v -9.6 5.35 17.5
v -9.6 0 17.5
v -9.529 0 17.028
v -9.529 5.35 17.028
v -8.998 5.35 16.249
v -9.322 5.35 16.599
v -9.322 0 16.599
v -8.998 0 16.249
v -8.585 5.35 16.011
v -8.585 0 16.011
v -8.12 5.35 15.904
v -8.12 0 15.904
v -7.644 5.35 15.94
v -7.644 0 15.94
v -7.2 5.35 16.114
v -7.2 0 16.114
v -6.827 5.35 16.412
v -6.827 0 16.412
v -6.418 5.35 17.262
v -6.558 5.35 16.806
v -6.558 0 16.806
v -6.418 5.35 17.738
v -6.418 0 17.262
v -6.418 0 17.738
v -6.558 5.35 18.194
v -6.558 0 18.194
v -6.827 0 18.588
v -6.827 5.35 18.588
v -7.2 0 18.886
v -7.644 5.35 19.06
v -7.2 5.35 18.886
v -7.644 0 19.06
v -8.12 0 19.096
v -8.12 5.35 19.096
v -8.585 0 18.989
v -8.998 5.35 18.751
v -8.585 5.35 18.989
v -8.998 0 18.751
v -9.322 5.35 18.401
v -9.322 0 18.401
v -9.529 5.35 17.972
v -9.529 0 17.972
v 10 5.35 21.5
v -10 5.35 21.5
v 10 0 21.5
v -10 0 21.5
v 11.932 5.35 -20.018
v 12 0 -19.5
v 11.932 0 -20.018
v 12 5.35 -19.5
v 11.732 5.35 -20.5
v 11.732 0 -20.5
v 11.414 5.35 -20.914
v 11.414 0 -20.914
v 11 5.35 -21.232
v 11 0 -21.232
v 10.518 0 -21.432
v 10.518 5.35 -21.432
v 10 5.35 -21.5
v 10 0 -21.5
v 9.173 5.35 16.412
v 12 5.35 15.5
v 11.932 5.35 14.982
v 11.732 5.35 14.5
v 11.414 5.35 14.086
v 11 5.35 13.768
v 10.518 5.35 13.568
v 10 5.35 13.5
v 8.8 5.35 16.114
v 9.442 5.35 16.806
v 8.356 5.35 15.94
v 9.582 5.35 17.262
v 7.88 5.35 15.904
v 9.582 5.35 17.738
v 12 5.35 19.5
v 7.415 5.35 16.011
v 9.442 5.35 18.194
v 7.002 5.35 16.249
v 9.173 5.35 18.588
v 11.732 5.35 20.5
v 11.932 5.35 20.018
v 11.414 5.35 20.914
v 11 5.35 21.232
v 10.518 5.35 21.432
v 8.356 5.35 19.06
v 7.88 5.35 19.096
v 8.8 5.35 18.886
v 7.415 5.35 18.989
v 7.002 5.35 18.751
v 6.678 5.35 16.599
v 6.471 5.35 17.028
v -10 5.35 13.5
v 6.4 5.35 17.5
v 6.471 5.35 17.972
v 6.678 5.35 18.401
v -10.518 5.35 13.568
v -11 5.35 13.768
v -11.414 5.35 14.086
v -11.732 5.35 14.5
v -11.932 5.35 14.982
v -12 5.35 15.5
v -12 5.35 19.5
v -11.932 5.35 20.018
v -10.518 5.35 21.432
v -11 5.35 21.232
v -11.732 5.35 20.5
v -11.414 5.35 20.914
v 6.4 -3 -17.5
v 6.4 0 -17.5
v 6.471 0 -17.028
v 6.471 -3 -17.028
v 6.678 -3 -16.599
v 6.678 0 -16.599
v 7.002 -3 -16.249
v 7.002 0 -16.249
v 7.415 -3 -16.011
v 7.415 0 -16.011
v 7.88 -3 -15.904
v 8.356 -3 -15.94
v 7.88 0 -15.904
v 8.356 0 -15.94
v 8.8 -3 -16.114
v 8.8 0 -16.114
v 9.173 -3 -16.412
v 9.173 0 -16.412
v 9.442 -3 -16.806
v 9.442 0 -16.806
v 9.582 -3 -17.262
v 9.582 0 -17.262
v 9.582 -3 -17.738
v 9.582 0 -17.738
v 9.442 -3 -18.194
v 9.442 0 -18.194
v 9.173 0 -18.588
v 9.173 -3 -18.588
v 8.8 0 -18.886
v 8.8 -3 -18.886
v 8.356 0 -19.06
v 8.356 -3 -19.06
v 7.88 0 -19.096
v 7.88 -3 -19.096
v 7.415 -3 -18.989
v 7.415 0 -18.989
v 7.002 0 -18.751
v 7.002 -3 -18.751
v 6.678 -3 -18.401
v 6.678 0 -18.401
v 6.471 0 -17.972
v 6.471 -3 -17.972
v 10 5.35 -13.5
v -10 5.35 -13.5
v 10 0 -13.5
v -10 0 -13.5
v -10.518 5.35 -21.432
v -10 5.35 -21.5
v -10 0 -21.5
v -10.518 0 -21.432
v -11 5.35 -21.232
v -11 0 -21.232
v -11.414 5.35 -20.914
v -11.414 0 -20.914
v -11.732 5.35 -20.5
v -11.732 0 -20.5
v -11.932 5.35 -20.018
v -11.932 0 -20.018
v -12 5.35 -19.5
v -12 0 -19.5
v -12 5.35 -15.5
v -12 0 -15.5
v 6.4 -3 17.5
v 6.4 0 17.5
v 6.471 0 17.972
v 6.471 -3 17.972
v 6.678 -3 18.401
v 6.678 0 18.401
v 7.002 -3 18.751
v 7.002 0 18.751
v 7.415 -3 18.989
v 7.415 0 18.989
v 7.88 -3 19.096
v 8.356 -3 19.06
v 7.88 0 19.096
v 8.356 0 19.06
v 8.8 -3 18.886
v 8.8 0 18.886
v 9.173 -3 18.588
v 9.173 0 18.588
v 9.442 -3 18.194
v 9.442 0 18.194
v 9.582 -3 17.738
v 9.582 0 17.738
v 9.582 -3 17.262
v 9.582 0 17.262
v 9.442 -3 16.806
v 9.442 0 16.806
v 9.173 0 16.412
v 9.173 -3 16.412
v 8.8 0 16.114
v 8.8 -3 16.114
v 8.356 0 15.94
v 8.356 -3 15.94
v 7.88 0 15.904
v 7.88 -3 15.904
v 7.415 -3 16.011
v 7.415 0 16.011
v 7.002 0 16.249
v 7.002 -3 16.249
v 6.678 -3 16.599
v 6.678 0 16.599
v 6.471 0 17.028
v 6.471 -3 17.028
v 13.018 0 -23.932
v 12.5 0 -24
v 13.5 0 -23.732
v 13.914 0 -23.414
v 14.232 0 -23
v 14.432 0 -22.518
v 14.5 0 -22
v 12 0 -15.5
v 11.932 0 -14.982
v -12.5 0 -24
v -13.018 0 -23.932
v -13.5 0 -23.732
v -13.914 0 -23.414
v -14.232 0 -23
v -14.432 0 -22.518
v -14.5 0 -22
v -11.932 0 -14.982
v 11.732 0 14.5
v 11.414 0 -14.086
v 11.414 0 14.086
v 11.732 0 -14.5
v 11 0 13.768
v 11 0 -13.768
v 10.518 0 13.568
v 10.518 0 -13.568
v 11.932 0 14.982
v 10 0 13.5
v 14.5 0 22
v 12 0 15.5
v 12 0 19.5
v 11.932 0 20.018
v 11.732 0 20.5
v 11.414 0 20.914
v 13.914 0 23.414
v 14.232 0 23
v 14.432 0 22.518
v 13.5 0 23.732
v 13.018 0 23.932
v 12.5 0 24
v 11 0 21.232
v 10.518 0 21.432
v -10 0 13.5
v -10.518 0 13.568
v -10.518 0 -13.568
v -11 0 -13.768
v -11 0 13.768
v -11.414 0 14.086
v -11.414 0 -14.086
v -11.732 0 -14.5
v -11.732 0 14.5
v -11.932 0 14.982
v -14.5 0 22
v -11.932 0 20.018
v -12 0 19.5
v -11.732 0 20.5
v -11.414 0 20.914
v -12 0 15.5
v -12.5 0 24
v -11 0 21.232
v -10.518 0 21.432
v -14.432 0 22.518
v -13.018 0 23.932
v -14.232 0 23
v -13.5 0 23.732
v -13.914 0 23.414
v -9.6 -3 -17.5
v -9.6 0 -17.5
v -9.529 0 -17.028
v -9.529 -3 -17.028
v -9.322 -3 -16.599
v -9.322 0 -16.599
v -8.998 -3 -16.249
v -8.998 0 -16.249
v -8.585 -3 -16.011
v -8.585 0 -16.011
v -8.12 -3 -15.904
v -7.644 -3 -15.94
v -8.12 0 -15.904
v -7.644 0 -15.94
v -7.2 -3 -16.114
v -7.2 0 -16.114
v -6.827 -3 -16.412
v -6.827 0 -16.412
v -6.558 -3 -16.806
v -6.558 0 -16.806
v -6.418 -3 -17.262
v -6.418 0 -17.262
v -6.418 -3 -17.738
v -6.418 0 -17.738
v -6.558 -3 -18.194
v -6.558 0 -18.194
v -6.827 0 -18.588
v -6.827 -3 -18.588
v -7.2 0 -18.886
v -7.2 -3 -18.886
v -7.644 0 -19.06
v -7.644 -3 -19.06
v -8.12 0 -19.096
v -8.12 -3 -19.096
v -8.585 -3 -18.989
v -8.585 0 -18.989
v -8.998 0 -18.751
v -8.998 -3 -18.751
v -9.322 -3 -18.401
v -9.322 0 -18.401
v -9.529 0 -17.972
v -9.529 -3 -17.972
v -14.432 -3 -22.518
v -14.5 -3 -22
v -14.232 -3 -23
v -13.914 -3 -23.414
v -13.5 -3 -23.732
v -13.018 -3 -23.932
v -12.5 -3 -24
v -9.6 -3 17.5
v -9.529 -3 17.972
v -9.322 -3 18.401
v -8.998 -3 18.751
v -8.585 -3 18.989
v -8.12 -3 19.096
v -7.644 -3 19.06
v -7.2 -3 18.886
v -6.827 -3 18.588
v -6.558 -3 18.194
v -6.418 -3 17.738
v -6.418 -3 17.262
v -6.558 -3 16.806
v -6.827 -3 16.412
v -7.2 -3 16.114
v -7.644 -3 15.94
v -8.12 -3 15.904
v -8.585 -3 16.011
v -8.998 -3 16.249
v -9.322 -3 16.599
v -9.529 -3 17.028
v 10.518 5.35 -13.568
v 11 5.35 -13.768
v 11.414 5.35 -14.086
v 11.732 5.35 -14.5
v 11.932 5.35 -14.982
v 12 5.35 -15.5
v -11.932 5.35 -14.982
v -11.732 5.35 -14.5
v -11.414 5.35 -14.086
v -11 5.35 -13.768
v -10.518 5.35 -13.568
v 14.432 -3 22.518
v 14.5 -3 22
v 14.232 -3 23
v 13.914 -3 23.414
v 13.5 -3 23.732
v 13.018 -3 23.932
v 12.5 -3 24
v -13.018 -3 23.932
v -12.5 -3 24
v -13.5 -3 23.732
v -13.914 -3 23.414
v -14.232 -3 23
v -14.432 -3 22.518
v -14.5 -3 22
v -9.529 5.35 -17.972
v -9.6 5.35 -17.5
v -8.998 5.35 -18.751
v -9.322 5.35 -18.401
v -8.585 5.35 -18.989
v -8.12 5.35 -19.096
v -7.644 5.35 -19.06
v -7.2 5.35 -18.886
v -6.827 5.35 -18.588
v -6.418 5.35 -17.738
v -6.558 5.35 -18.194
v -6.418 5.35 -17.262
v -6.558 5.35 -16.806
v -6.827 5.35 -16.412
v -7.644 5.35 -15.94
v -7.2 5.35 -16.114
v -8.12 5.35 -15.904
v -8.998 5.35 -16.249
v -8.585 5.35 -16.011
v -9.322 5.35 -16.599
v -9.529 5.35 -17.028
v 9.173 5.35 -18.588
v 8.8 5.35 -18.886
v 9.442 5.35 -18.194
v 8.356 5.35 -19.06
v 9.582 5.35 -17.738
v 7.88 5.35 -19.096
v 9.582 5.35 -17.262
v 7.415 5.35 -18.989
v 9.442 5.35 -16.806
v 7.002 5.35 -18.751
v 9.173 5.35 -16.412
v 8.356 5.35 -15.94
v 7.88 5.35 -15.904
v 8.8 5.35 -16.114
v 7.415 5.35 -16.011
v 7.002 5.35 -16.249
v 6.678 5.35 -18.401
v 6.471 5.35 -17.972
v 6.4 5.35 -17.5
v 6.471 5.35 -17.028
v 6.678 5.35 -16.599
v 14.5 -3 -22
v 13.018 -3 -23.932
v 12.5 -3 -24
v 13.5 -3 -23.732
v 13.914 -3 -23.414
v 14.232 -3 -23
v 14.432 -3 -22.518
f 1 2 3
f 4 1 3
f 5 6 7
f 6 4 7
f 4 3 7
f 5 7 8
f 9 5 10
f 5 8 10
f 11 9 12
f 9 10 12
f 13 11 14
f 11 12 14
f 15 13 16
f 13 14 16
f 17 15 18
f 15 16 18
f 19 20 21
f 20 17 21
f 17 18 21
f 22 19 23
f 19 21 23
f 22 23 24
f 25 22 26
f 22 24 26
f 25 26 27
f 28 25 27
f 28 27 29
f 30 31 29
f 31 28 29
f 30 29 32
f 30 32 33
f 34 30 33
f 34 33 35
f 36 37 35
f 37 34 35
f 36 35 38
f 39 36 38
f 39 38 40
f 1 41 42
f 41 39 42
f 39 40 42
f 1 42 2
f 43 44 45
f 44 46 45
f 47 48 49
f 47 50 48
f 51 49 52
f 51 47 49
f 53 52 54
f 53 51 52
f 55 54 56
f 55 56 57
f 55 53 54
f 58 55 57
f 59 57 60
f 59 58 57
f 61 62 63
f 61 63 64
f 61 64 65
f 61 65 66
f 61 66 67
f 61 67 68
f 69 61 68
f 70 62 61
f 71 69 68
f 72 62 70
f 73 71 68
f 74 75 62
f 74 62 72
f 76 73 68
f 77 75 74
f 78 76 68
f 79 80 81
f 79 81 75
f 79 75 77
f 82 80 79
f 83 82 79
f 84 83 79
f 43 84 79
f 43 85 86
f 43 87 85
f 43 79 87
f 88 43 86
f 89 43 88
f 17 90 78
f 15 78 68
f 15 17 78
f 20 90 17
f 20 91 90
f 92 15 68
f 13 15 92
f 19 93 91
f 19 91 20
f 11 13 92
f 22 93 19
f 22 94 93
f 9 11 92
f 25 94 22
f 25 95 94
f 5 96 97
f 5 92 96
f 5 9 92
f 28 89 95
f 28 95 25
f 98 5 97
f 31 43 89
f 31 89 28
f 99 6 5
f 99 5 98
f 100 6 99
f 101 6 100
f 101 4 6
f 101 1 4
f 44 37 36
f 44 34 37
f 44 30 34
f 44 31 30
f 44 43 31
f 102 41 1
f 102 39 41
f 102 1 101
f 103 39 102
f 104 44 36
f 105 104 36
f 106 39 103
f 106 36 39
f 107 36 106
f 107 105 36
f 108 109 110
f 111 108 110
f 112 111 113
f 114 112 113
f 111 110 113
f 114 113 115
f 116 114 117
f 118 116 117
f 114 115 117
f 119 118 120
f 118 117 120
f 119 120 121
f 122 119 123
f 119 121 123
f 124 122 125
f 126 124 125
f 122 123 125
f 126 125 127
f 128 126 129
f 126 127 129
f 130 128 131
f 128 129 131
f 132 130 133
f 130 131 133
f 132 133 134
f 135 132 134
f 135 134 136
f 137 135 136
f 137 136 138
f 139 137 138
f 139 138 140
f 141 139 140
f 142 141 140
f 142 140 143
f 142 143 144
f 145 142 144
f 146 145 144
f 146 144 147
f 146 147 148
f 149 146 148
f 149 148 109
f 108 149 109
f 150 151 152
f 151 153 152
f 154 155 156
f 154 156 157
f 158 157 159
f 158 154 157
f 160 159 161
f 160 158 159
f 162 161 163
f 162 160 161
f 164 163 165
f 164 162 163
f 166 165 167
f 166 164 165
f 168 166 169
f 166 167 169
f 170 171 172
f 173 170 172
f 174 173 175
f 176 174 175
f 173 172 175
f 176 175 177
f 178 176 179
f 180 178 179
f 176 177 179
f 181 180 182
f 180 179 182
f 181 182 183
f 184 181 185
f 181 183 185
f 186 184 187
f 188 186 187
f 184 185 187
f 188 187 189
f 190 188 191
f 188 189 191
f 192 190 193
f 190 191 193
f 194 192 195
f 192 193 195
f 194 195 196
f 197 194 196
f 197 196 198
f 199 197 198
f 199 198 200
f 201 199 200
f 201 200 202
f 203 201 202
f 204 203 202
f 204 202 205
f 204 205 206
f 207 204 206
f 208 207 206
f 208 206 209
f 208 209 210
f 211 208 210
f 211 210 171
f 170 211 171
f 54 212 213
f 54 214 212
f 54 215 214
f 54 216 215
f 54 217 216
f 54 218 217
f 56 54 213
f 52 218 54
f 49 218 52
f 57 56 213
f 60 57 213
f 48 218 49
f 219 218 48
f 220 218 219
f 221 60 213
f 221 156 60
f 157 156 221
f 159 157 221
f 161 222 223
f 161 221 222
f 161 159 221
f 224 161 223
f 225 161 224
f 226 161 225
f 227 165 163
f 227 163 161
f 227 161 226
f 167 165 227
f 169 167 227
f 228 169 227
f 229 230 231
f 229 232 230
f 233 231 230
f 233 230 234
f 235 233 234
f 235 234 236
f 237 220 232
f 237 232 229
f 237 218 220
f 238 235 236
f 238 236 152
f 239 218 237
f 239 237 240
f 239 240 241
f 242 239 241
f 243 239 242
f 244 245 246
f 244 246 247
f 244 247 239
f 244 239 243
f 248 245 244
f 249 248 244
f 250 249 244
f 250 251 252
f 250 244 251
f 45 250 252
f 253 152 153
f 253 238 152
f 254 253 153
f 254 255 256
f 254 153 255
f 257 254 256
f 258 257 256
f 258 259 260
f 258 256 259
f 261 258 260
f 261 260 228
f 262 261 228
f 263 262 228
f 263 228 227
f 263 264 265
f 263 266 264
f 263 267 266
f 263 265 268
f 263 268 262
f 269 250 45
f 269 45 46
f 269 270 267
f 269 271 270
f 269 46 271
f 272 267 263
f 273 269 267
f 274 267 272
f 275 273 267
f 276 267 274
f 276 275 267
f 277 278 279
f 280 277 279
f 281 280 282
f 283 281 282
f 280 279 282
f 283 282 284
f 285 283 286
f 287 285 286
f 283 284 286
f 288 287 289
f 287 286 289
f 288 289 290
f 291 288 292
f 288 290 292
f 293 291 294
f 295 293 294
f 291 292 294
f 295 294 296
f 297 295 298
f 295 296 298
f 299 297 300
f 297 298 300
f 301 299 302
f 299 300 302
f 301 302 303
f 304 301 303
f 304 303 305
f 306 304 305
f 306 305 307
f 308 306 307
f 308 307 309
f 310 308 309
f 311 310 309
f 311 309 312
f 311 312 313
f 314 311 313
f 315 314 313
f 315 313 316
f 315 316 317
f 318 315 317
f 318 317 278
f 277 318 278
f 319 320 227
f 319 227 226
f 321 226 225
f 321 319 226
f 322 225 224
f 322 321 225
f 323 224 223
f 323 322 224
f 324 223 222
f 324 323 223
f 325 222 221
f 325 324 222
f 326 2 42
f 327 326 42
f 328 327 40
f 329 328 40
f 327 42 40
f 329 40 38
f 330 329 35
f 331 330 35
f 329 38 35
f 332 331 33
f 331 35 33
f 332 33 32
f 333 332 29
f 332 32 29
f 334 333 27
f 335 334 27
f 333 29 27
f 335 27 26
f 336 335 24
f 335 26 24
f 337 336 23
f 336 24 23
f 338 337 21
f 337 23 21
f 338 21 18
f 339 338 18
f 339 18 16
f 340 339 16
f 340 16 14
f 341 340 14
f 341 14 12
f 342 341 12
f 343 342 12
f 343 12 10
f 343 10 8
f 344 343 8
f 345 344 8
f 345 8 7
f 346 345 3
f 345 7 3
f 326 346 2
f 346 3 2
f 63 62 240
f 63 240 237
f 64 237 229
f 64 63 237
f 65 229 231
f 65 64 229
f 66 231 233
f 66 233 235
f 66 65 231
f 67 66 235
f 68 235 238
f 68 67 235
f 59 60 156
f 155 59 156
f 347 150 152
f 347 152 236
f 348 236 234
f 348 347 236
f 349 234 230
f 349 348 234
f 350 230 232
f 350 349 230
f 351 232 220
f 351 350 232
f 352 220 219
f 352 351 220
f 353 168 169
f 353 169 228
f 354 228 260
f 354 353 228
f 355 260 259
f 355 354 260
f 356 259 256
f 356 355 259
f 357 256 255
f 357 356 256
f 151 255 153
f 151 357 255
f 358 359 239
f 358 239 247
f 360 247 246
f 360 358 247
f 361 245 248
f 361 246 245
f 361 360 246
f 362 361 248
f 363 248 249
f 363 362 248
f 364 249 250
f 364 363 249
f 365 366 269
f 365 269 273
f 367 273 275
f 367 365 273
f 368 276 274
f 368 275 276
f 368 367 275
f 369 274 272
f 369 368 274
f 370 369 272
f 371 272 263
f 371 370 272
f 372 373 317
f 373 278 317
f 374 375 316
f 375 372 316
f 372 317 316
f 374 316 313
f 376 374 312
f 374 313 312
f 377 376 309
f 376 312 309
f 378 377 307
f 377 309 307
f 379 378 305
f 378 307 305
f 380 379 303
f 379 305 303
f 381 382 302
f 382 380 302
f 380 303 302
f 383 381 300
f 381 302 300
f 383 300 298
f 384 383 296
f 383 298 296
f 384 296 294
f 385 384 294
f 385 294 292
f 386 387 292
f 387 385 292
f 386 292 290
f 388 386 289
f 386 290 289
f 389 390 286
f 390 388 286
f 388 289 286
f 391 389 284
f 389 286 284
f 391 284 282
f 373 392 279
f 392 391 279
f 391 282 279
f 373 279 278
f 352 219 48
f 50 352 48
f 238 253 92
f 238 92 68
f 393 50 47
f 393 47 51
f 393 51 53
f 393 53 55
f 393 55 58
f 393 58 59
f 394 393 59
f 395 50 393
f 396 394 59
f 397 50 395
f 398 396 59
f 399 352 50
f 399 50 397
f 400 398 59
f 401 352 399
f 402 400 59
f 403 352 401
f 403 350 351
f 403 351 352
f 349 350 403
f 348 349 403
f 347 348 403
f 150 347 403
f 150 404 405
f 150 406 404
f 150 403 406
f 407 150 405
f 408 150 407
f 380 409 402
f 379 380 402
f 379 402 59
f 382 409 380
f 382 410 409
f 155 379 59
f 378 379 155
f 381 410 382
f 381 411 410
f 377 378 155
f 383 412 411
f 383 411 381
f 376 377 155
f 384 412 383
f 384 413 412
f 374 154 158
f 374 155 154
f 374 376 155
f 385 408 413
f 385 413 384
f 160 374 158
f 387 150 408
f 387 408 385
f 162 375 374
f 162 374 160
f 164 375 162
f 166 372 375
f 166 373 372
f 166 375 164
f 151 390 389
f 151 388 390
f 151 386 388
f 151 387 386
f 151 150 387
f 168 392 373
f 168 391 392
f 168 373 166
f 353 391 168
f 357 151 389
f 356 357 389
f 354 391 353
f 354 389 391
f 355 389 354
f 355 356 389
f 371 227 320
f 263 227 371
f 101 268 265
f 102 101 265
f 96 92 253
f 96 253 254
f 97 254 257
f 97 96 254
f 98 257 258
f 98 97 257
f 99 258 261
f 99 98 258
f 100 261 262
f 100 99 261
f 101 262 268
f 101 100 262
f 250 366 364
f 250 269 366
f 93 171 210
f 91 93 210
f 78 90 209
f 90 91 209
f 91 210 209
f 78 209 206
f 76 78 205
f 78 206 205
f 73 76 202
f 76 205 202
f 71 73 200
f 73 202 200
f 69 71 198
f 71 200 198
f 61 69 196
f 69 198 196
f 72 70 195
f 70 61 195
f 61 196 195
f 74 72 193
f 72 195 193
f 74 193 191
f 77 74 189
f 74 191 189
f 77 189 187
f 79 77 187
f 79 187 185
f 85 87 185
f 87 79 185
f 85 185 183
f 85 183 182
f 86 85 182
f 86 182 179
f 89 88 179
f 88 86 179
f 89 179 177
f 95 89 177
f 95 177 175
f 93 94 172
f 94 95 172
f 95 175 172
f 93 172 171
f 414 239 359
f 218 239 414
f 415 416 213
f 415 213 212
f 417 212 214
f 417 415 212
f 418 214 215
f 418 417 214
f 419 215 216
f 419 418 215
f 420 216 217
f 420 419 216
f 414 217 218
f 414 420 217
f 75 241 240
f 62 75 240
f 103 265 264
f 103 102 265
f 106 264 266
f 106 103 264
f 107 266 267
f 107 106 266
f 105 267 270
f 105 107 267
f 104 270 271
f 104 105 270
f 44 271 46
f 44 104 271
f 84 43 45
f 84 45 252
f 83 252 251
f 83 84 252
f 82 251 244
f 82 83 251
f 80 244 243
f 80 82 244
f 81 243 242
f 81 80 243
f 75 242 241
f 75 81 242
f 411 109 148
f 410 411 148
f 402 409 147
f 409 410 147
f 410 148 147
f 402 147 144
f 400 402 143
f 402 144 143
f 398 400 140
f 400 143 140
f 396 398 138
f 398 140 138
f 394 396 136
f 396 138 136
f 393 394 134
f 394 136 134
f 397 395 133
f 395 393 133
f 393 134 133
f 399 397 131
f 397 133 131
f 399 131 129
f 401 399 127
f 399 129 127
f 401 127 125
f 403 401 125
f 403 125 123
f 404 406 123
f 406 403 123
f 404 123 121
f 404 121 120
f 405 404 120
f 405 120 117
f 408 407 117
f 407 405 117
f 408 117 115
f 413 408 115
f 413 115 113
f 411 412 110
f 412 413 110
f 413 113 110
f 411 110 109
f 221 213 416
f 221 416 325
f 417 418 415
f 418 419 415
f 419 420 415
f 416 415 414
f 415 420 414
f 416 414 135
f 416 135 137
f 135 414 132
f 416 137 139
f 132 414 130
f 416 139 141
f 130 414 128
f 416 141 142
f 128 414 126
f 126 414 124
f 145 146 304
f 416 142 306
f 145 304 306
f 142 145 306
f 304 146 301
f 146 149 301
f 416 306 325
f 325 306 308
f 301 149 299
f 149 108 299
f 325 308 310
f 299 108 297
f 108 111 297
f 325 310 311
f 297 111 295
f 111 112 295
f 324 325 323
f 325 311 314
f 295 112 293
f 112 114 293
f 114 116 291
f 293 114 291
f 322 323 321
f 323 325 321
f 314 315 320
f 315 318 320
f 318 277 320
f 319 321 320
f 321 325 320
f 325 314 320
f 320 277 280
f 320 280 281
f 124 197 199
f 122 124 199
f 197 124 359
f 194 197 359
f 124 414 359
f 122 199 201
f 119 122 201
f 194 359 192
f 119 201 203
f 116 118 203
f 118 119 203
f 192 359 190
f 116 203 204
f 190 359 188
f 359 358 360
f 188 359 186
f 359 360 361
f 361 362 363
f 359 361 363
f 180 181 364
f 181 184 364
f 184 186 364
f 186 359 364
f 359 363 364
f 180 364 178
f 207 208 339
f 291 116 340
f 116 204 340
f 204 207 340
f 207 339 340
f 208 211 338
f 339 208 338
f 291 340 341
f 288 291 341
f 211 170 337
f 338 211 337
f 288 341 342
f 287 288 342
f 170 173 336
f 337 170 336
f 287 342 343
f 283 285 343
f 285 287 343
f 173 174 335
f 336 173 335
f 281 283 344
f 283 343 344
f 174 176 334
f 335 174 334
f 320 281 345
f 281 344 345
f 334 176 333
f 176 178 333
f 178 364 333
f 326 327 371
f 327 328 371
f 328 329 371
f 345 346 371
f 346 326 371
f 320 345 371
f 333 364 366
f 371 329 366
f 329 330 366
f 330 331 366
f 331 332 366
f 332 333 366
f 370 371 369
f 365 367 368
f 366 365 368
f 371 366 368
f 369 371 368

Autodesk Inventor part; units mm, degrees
ref_plane "YZ Plane" through (0, 0, 0) normal (1, 0, 0) x (0, 1, 0)
ref_plane "XZ Plane" through (0, 0, 0) normal (0, 1, 0) x (-1, 0, 0)
ref_plane "XY Plane" through (0, 0, 0) normal (0, 0, 1) x (1, 0, 0)
sketch "Sketch1" plane through (0, 0, 0) normal (0, 1, 0) x (-1, 0, 0)
  line L0 (12, 21.5) -> (-12, 21.5)
  line L1 (-12, 21.5) -> (-12, -21.5)
  line L2 (-12, -21.5) -> (12, -21.5)
  line L3 (12, -21.5) -> (12, 21.5)
  line L4 (12.5, 22) -> (-12.5, 22)
  line L5 (-12.5, 22) -> (-12.5, -22)
  line L6 (-12.5, -22) -> (12.5, -22)
  line L7 (12.5, -22) -> (12.5, 22)
  line L8 (14.5, 24) -> (-14.5, 24)
  line L9 (-14.5, 24) -> (-14.5, -24)
  line L10 (-14.5, -24) -> (14.5, -24)
  line L11 (14.5, -24) -> (14.5, 24)
  circle A0 centre (8, 17.5) radius 1.6
  circle A1 centre (8, -17.5) radius 1.6
  circle A2 centre (-8, 17.5) radius 1.6
  circle A3 centre (-8, -17.5) radius 1.6
  line L12 (12, -13.5) -> (-12, -13.5)
  line L13 (12, 13.5) -> (-12, 13.5)
  point P0 (0, 0)
  dimension "d0" = 43
  dimension "d1" = 24
  dimension "d2" = 12
  dimension "d3" = 21.5
  dimension "d4" = 4
  dimension "d5" = 4
  dimension "d6" = 4
  dimension "d7" = 4
  dimension "d8" = 0.5
  dimension "d9" = 2
  dimension "d10" = 3.2
  dimension "d11" = 3.2
  dimension "d12" = 3.2
  dimension "d13" = 3.2
  dimension "d45" = 8
  dimension "d46" = 8
extrude "Extrusion1" add sketch "Sketch1" against normal blind 3 contours L3 L13 L1 L0 | L3 L12 L1 L13 | L3 L2 L1 L12 | L7 L6 L5 L4 | L11 L10 L9 L8 | A0 | A1 | A2 | A3
extrude "Extrusion3" cut sketch "Sketch1" against normal blind 6 contours A0 | A1 | A2 | A3
extrude "Extrusion7" add sketch "Sketch1" along normal blind 5.35 contours L3 L13 L1 L0 | L3 L2 L1 L12
fillet "Fillet3" radius 2 4 edges at (14.5, -1.5, 24) (-14.5, -1.5, 24) (14.5, -1.5, -24) (-14.5, -1.5, -24)
fillet "Fillet4" radius 2 8 edges at (12, 2.675, 21.5) (12, 2.675, 13.5) (-12, 2.675, 21.5) (-12, 2.675, 13.5) (12, 2.675, -13.5) (12, 2.675, -21.5) (-12, 2.675, -21.5) (-12, 2.675, -13.5)
equation "\"d2\" = 0.5 * d1"
equation "\"d3\" = 0.5 * d0"
equation "\"d5\" = d4"
equation "\"d6\" = d5"
equation "\"d7\" = d4"
equation "\"d10\" = d13"
equation "\"d11\" = d13"
equation "\"d12\" = d13"
properties part number "3DP_ASA_Bias_Tee_Case_Top"
